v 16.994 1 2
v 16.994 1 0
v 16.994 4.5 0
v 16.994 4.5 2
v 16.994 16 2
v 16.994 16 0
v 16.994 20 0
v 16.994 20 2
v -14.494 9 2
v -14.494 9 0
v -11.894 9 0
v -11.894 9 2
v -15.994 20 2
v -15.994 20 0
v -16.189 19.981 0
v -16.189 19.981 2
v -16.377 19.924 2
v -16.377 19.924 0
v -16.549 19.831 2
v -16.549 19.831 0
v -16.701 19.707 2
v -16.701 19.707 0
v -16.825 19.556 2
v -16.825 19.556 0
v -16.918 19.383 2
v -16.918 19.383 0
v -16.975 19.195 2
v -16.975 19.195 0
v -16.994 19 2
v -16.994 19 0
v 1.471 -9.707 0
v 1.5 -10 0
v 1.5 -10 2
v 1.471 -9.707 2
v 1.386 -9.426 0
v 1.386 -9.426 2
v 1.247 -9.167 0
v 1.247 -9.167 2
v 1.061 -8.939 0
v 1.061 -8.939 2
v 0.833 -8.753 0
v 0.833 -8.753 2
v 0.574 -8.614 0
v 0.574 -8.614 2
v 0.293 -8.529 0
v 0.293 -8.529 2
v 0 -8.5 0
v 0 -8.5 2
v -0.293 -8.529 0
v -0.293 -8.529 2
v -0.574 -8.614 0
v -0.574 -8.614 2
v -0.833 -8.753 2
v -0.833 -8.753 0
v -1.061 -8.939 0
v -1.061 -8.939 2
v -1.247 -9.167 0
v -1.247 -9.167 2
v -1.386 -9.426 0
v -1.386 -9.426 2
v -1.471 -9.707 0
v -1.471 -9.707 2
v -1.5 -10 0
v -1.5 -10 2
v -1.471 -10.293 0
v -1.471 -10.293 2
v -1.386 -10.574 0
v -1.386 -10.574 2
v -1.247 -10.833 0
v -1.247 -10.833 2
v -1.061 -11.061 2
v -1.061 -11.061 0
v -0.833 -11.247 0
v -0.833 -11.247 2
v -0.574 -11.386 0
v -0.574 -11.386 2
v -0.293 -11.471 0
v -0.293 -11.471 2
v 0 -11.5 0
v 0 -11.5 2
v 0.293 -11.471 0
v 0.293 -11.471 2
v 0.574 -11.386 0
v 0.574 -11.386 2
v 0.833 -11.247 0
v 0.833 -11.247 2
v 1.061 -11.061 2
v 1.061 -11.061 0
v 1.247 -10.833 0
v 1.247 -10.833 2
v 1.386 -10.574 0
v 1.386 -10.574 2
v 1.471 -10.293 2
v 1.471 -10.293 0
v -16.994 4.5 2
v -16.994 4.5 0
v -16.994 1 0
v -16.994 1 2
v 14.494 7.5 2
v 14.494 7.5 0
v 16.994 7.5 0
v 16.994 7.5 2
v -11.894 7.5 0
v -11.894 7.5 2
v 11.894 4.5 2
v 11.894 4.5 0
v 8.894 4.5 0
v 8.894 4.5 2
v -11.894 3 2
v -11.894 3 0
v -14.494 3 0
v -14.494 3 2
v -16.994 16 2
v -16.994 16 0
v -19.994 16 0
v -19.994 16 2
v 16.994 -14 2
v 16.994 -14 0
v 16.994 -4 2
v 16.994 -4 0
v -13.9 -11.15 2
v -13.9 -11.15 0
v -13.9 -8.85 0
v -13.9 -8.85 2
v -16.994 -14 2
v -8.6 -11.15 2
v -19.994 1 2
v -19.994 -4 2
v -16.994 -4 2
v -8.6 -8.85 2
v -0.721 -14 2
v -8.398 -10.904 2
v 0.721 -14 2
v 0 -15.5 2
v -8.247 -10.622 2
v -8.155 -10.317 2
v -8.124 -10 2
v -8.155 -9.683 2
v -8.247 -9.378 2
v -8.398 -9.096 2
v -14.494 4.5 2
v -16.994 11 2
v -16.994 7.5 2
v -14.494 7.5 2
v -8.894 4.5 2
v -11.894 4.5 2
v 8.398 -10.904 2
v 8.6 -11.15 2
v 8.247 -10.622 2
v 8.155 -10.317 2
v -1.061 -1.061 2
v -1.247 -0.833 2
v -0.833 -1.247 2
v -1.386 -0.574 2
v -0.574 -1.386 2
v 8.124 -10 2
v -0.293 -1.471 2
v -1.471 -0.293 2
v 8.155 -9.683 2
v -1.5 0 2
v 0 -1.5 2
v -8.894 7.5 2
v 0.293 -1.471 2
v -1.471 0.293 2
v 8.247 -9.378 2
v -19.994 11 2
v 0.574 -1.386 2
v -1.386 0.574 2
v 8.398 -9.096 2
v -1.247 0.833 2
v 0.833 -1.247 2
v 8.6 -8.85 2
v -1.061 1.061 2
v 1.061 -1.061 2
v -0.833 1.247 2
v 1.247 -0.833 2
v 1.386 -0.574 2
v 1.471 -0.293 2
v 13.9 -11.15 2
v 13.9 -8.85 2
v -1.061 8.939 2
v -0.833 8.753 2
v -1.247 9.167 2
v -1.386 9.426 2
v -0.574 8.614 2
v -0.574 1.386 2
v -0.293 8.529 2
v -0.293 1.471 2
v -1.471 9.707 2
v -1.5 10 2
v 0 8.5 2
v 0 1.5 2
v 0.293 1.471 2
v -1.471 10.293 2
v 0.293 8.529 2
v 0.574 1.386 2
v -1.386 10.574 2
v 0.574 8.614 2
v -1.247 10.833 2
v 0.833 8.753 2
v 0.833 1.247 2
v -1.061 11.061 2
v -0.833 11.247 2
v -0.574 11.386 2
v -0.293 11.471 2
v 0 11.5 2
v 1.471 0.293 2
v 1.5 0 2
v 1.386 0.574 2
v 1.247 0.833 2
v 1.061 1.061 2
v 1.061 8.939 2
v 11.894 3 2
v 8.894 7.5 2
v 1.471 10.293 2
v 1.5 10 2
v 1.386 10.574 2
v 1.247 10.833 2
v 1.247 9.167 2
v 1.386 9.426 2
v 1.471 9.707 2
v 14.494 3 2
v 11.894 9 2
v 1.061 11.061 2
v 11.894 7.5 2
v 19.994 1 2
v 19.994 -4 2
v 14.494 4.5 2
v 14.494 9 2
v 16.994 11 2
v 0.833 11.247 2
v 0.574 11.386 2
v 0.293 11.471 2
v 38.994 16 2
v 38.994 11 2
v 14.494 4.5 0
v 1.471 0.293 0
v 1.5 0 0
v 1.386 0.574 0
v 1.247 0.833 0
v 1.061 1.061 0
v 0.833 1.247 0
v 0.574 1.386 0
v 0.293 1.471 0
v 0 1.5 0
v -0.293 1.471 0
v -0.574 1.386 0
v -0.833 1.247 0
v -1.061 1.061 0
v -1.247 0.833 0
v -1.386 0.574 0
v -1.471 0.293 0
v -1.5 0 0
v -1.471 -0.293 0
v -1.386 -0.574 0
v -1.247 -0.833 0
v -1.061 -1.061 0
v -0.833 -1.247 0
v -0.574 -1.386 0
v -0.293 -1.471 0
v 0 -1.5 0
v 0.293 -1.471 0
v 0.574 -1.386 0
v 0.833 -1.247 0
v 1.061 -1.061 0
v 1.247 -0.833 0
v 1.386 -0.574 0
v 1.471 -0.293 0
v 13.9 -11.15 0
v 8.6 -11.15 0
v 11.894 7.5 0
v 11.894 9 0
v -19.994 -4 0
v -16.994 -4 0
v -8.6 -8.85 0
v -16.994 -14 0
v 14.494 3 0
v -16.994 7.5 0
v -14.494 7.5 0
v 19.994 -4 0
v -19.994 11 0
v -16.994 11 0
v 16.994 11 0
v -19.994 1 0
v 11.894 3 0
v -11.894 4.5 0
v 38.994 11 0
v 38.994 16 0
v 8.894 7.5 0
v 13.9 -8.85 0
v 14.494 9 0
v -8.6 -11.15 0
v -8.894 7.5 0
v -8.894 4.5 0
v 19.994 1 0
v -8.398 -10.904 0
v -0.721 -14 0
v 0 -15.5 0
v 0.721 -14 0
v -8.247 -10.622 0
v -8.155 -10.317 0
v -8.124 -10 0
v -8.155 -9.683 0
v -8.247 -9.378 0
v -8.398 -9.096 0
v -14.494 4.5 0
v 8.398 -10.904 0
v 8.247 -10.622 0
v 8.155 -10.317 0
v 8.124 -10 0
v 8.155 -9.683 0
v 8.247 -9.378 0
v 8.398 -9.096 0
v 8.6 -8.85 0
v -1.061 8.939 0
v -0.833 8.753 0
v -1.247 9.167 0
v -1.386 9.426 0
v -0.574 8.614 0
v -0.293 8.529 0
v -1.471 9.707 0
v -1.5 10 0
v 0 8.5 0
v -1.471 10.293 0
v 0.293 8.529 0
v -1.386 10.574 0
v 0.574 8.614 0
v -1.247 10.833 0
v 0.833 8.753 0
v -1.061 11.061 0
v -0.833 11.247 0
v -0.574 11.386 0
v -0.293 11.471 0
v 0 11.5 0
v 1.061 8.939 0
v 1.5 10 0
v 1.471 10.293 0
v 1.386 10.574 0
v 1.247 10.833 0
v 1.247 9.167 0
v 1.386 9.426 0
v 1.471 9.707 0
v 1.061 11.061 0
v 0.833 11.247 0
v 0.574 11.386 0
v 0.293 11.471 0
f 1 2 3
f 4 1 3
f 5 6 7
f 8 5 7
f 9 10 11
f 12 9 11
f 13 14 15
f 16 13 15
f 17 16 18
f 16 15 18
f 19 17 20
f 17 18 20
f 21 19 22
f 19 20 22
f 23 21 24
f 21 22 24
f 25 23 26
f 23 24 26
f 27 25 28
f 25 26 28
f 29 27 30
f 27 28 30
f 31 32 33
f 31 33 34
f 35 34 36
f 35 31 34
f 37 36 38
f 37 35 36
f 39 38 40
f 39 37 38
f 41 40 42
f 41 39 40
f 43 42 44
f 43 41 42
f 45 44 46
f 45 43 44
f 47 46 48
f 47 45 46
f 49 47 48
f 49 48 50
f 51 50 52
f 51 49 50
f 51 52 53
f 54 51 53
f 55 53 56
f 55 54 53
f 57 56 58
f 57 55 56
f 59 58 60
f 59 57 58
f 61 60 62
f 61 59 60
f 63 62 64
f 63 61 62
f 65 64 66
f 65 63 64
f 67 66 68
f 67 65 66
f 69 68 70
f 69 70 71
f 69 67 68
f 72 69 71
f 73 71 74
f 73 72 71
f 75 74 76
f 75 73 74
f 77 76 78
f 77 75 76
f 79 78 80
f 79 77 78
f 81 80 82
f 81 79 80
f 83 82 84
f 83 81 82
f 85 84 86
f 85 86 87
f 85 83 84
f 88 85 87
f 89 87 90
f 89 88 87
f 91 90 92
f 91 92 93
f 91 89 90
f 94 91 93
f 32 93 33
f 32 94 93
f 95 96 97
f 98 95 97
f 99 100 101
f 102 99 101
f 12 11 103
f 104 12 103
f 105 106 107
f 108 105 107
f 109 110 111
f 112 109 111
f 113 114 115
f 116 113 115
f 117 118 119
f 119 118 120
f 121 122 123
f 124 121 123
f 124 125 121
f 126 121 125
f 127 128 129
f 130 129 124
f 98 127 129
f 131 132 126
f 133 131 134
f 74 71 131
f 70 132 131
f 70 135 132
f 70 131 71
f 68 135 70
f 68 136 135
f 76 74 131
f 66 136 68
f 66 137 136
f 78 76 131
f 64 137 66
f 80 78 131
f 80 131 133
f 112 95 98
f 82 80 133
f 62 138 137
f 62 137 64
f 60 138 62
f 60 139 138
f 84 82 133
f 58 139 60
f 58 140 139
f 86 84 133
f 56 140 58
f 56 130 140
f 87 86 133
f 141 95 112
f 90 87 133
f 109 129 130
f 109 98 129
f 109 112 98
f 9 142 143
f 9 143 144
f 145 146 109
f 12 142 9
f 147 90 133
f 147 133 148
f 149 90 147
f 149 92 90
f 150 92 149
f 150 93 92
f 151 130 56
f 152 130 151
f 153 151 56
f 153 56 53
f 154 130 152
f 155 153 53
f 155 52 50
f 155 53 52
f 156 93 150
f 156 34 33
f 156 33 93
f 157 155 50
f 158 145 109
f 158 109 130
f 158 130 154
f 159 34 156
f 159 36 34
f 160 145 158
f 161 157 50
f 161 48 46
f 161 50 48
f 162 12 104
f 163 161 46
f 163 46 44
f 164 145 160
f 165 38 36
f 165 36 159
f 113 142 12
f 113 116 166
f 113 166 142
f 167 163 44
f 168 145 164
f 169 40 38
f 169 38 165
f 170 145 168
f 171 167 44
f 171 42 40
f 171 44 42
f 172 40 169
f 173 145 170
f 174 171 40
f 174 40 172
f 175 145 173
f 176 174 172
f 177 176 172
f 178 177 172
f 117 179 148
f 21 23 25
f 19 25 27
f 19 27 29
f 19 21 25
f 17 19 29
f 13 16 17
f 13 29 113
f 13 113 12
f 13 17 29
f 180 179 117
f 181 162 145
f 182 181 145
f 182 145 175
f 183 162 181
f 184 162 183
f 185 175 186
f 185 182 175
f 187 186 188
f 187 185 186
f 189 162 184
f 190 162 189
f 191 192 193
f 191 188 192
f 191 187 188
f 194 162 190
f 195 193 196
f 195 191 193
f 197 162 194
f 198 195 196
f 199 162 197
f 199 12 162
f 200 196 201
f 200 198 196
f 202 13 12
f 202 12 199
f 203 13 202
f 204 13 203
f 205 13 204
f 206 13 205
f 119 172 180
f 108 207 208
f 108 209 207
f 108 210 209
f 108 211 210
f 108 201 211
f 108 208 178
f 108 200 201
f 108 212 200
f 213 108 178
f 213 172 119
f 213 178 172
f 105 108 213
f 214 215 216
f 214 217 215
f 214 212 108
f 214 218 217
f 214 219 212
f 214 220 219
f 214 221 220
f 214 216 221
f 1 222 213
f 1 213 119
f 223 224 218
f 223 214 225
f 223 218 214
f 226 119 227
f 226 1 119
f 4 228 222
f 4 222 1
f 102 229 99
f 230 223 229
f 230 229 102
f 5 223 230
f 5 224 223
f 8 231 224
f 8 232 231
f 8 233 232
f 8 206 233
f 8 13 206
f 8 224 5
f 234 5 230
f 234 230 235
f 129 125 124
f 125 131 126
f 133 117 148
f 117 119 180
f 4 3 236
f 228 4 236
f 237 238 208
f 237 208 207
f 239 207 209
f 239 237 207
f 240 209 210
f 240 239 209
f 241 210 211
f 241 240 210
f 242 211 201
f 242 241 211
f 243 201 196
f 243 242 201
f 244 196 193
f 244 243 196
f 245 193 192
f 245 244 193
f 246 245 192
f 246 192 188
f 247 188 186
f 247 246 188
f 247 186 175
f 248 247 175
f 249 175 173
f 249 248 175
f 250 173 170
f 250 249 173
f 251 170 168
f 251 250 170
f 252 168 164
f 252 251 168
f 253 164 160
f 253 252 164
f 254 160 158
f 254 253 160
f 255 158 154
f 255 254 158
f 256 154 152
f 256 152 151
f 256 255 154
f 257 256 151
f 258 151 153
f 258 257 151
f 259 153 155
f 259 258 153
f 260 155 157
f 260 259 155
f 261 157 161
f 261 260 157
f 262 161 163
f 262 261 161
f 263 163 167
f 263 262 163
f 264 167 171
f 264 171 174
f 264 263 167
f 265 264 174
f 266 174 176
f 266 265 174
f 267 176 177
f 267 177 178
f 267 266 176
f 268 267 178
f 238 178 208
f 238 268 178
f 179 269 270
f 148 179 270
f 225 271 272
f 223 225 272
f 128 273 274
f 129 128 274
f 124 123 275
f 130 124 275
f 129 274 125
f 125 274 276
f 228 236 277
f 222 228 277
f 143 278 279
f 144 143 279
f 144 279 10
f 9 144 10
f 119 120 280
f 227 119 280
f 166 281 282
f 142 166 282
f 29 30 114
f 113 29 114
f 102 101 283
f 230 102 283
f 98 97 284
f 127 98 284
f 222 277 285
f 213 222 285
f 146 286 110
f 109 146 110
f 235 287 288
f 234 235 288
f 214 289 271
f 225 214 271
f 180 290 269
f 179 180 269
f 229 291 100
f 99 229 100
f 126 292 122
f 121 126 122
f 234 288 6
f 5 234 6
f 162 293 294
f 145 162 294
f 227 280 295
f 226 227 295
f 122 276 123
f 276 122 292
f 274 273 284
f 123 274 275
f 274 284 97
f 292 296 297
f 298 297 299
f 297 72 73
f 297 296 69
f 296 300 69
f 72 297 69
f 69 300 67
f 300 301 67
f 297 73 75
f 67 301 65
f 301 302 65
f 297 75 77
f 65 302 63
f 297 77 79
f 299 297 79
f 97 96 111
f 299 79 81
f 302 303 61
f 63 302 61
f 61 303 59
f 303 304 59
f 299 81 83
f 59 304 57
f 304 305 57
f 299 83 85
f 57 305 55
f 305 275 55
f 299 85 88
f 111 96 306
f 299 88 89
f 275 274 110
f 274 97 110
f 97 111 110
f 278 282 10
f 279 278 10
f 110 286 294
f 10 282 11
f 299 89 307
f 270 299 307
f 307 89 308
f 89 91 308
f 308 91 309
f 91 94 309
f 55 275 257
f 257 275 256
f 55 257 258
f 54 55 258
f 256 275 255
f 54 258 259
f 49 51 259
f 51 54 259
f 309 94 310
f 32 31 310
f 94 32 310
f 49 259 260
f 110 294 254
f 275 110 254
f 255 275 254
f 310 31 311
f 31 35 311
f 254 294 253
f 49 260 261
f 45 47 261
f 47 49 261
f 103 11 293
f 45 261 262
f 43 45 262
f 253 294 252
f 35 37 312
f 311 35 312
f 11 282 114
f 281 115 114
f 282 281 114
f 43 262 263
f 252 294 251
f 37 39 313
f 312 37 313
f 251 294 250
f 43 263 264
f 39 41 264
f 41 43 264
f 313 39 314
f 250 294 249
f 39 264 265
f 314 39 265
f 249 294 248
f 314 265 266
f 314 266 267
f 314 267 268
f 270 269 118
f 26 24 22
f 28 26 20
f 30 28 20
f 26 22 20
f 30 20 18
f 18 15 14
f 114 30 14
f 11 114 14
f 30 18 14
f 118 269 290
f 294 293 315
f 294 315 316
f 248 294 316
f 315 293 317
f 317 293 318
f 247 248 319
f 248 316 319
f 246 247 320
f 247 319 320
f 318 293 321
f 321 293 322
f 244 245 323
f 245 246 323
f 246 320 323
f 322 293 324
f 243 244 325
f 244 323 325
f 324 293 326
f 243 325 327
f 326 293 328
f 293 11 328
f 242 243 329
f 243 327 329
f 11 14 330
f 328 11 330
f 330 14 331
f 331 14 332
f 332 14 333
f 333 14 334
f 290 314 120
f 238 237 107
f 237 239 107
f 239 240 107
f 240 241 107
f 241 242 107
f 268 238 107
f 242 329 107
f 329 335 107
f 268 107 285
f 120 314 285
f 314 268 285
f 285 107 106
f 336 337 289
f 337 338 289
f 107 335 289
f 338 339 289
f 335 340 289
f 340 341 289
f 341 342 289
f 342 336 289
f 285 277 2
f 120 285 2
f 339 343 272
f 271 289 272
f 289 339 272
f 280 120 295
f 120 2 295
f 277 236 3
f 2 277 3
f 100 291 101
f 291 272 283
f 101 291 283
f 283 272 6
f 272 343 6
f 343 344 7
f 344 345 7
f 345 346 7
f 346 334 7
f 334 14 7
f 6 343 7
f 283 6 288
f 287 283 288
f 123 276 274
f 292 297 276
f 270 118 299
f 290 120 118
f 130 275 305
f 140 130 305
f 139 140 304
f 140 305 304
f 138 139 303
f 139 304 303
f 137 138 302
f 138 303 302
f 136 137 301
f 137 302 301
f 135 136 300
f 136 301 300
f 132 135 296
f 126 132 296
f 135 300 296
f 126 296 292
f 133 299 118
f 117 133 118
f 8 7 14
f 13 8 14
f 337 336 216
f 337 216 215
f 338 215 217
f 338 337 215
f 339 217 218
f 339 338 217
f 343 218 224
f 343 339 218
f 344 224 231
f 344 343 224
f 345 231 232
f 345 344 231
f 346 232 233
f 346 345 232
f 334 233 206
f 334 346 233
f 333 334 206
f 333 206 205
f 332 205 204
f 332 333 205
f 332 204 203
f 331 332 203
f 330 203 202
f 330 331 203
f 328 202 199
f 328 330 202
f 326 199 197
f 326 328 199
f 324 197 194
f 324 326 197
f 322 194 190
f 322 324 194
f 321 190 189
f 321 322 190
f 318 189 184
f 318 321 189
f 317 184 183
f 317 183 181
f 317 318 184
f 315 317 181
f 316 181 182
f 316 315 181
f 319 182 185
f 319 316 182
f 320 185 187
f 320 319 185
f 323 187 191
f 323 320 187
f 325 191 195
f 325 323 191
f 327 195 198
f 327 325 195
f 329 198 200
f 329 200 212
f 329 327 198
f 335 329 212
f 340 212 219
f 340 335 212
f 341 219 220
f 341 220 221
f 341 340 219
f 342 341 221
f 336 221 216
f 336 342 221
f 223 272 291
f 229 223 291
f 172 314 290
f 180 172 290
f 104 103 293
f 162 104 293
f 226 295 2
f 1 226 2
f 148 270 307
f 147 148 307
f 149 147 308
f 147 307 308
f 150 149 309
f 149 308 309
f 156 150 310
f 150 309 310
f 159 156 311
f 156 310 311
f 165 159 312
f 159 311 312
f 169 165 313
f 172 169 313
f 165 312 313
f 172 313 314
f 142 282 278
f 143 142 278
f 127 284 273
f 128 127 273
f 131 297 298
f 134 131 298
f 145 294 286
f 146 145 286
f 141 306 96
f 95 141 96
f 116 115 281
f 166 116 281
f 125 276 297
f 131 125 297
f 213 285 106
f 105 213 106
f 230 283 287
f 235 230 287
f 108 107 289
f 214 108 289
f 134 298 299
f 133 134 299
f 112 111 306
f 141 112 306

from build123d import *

# Parameters (mm, degrees)
SKETCH_1_R      = 1.5
EXTRUDE_1_DEPTH = 2


with BuildPart() as part:
    # 草图1 → 凸台-拉伸1 (new body)
    with BuildSketch(Plane.XY):
        with BuildLine():
            Line((16.993865071, 16), (16.993865071, 20))
            Line((16.993865071, 20), (-15.993865071, 20))
            ThreePointArc((-15.993865071, 20), (-16.700971852, 19.707106781), (-16.993865071, 19))
            Line((-16.993865071, 19), (-16.993865071, 16))
            Line((-16.993865071, 16), (-19.993865071, 16))
            Line((-19.993865071, 16), (-19.993865071, 11))
            Line((-19.993865071, 11), (-16.993865071, 11))
            Line((-16.993865071, 11), (-16.993865071, 7.5))
            Line((-16.993865071, 7.5), (-14.493865071, 7.5))
            Line((-14.493865071, 7.5), (-14.493865071, 9))
            Line((-14.493865071, 9), (-11.893865071, 9))
            Line((-11.893865071, 9), (-11.893865071, 7.5))
            Line((-11.893865071, 7.5), (-8.893865071, 7.5))
            Line((-8.893865071, 7.5), (-8.893865071, 4.5))
            Line((-8.893865071, 4.5), (-11.893865071, 4.5))
            Line((-11.893865071, 4.5), (-11.893865071, 3))
            Line((-11.893865071, 3), (-14.493865071, 3))
            Line((-14.493865071, 3), (-14.493865071, 4.5))
            Line((-14.493865071, 4.5), (-16.993865071, 4.5))
            Line((-16.993865071, 4.5), (-16.993865071, 1))
            Line((-16.993865071, 1), (-19.993865071, 1))
            Line((-19.993865071, 1), (-19.993865071, -4))
            Line((-19.993865071, -4), (-16.993865071, -4))
            Line((-16.993865071, -4), (-16.993865071, -13))
            Line((-16.993865071, -13), (-16.993865071, -14))
            Line((-16.993865071, -14), (-0.721190694, -14))
            Line((-0.721190694, -14), (0, -15.5))
            Line((0, -15.5), (0.721190694, -14))
            Line((0.721190694, -14), (16.993865071, -14))
            Line((16.993865071, -14), (16.993865071, -13))
            Line((16.993865071, -13), (16.993865071, -4))
            Line((16.993865071, -4), (19.993865071, -4))
            Line((19.993865071, -4), (19.993865071, 1))
            Line((19.993865071, 1), (16.993865071, 1))
            Line((16.993865071, 1), (16.993865071, 4.5))
            Line((16.993865071, 4.5), (14.493865071, 4.5))
            Line((14.493865071, 4.5), (14.493865071, 3))
            Line((14.493865071, 3), (11.893865071, 3))
            Line((11.893865071, 3), (11.893865071, 4.5))
            Line((11.893865071, 4.5), (8.893865071, 4.5))
            Line((8.893865071, 4.5), (8.893865071, 7.5))
            Line((8.893865071, 7.5), (11.893865071, 7.5))
            Line((11.893865071, 7.5), (11.893865071, 9))
            Line((11.893865071, 9), (14.493865071, 9))
            Line((14.493865071, 9), (14.493865071, 7.5))
            Line((14.493865071, 7.5), (16.993865071, 7.5))
            Line((16.993865071, 7.5), (16.993865071, 11))
            Line((16.993865071, 11), (38.993865071, 11))
            Line((38.993865071, 11), (38.993865071, 16))
            Line((38.993865071, 16), (16.993865071, 16))
        make_face()
        with Locations((0, -10)):
            Circle(SKETCH_1_R, mode=Mode.SUBTRACT)
        Circle(SKETCH_1_R, mode=Mode.SUBTRACT)
        with Locations((0, 10)):
            Circle(SKETCH_1_R, mode=Mode.SUBTRACT)
        with BuildLine():
            Line((13.9, -11.15), (8.6, -11.15))
            ThreePointArc((8.6, -11.15), (8.123654403, -10), (8.6, -8.85))
            Line((8.6, -8.85), (13.9, -8.85))
            Line((13.9, -8.85), (13.9, -11.15))
        make_face(mode=Mode.SUBTRACT)
        with BuildLine():
            Line((-13.9, -8.85), (-8.6, -8.85))
            ThreePointArc((-8.6, -8.85), (-8.123654403, -10), (-8.6, -11.15))
            Line((-8.6, -11.15), (-13.9, -11.15))
            Line((-13.9, -11.15), (-13.9, -8.85))
        make_face(mode=Mode.SUBTRACT)
    extrude(amount=EXTRUDE_1_DEPTH)


solid = part.part
